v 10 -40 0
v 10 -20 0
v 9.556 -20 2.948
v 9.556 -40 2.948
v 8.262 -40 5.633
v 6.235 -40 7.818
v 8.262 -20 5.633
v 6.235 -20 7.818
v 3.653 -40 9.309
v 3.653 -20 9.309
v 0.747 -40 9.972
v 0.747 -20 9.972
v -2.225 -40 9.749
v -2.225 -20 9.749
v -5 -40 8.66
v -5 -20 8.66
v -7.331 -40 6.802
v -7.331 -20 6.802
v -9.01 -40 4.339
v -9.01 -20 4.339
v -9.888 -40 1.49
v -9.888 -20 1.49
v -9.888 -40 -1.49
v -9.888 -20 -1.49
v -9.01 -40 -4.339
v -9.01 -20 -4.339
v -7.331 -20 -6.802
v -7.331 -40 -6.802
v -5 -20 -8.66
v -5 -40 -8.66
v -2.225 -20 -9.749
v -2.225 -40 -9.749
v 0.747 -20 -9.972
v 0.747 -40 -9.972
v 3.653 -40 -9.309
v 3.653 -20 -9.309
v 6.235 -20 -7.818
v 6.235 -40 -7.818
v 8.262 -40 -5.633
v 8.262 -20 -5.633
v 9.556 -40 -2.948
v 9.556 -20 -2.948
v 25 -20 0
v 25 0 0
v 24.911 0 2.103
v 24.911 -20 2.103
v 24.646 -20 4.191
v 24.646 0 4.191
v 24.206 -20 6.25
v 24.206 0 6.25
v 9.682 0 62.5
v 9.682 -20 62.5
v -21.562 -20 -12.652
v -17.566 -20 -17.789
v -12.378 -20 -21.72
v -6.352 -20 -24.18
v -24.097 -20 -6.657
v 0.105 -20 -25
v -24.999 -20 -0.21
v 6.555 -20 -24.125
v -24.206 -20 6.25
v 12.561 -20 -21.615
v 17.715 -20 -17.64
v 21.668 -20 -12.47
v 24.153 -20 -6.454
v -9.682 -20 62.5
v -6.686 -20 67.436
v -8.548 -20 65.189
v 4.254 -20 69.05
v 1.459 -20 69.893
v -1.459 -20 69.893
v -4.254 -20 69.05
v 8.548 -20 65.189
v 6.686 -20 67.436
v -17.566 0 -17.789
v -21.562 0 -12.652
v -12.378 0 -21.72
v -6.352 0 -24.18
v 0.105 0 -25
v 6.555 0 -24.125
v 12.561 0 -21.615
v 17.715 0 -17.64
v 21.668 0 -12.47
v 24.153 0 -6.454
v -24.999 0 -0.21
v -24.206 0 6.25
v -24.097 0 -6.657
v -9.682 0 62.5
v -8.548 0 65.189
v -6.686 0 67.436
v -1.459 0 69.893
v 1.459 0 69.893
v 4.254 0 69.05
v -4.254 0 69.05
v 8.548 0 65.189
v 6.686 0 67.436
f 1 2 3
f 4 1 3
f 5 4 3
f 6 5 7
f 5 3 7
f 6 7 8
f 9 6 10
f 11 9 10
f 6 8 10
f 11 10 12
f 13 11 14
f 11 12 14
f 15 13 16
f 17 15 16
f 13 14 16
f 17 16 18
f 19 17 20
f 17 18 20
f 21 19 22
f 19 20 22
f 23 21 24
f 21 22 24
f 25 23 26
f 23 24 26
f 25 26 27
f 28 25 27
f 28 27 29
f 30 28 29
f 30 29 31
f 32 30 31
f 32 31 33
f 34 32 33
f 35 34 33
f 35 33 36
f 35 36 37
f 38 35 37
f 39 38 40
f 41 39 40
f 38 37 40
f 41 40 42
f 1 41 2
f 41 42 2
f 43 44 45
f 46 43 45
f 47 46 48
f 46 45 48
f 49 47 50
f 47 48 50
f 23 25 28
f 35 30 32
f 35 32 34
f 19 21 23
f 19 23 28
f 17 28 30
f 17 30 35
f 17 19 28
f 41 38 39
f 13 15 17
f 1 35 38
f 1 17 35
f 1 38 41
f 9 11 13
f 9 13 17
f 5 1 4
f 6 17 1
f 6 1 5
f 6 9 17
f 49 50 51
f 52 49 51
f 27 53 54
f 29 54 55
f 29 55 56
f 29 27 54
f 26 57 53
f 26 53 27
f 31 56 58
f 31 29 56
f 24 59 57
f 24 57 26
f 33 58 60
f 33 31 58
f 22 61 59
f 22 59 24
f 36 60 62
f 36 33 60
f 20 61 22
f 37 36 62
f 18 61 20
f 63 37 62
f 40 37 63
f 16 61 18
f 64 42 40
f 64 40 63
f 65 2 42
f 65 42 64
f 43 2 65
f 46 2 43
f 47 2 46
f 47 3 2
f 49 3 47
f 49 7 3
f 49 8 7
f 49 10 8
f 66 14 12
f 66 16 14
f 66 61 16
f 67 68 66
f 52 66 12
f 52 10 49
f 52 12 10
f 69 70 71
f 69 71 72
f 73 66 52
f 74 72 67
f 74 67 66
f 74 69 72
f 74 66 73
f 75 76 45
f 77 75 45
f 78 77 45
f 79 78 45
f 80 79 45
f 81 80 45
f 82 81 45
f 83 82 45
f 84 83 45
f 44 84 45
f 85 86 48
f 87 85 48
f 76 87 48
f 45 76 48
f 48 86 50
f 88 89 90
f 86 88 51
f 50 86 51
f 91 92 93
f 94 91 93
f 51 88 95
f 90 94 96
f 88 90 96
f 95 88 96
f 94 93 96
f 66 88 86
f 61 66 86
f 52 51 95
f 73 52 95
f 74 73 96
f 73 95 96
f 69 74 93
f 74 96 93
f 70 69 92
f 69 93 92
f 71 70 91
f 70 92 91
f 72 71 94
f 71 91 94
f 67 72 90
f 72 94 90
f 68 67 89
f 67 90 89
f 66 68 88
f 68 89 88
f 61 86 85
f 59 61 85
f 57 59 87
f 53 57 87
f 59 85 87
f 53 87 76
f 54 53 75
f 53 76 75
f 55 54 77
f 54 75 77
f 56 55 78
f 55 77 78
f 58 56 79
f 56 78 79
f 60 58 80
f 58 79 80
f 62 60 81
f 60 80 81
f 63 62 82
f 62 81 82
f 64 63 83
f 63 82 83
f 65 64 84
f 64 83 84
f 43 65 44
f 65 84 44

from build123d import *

# Parameters (mm, degrees)
F1_DEPTH = 20
F2_R     = 10
F3_DEPTH = 20


with BuildPart() as f1:
    # F0 (on Front) → F1 (new body)
    with BuildSketch(Plane.XZ):
        with BuildLine():
            ThreePointArc((-9.682458, 62.5), (-1.260043, 50.079703), (10, 60))
            ThreePointArc((10, 60), (9.920297, 61.260043), (9.682458, 62.5))
            ThreePointArc((9.682458, 62.5), (0, 70), (-9.682458, 62.5))
        make_face()
        with BuildLine():
            ThreePointArc((9.682458, 62.5), (9.920297, 61.260043), (10, 60))
            ThreePointArc((10, 60), (-1.260043, 50.079703), (-9.682458, 62.5))
            Line((-9.682458, 62.5), (-24.206146, 6.25))
            ThreePointArc((-24.206146, 6.25), (0, 25), (24.206146, 6.25))
            Line((24.206146, 6.25), (9.682458, 62.5))
        make_face()
        with BuildLine():
            ThreePointArc((25, 0), (24.800742, 3.150107), (24.206146, 6.25))
            ThreePointArc((24.206146, 6.25), (0, 25), (-24.206146, 6.25))
            ThreePointArc((-24.206146, 6.25), (-3.150107, -24.800742), (25, 0))
        make_face()
    extrude(amount=F1_DEPTH)

    # F2 (on face) → F3 (join)
    with BuildSketch(Plane.XZ.offset(20)):
        Circle(F2_R)
    extrude(amount=F3_DEPTH)


solid = f1.part
